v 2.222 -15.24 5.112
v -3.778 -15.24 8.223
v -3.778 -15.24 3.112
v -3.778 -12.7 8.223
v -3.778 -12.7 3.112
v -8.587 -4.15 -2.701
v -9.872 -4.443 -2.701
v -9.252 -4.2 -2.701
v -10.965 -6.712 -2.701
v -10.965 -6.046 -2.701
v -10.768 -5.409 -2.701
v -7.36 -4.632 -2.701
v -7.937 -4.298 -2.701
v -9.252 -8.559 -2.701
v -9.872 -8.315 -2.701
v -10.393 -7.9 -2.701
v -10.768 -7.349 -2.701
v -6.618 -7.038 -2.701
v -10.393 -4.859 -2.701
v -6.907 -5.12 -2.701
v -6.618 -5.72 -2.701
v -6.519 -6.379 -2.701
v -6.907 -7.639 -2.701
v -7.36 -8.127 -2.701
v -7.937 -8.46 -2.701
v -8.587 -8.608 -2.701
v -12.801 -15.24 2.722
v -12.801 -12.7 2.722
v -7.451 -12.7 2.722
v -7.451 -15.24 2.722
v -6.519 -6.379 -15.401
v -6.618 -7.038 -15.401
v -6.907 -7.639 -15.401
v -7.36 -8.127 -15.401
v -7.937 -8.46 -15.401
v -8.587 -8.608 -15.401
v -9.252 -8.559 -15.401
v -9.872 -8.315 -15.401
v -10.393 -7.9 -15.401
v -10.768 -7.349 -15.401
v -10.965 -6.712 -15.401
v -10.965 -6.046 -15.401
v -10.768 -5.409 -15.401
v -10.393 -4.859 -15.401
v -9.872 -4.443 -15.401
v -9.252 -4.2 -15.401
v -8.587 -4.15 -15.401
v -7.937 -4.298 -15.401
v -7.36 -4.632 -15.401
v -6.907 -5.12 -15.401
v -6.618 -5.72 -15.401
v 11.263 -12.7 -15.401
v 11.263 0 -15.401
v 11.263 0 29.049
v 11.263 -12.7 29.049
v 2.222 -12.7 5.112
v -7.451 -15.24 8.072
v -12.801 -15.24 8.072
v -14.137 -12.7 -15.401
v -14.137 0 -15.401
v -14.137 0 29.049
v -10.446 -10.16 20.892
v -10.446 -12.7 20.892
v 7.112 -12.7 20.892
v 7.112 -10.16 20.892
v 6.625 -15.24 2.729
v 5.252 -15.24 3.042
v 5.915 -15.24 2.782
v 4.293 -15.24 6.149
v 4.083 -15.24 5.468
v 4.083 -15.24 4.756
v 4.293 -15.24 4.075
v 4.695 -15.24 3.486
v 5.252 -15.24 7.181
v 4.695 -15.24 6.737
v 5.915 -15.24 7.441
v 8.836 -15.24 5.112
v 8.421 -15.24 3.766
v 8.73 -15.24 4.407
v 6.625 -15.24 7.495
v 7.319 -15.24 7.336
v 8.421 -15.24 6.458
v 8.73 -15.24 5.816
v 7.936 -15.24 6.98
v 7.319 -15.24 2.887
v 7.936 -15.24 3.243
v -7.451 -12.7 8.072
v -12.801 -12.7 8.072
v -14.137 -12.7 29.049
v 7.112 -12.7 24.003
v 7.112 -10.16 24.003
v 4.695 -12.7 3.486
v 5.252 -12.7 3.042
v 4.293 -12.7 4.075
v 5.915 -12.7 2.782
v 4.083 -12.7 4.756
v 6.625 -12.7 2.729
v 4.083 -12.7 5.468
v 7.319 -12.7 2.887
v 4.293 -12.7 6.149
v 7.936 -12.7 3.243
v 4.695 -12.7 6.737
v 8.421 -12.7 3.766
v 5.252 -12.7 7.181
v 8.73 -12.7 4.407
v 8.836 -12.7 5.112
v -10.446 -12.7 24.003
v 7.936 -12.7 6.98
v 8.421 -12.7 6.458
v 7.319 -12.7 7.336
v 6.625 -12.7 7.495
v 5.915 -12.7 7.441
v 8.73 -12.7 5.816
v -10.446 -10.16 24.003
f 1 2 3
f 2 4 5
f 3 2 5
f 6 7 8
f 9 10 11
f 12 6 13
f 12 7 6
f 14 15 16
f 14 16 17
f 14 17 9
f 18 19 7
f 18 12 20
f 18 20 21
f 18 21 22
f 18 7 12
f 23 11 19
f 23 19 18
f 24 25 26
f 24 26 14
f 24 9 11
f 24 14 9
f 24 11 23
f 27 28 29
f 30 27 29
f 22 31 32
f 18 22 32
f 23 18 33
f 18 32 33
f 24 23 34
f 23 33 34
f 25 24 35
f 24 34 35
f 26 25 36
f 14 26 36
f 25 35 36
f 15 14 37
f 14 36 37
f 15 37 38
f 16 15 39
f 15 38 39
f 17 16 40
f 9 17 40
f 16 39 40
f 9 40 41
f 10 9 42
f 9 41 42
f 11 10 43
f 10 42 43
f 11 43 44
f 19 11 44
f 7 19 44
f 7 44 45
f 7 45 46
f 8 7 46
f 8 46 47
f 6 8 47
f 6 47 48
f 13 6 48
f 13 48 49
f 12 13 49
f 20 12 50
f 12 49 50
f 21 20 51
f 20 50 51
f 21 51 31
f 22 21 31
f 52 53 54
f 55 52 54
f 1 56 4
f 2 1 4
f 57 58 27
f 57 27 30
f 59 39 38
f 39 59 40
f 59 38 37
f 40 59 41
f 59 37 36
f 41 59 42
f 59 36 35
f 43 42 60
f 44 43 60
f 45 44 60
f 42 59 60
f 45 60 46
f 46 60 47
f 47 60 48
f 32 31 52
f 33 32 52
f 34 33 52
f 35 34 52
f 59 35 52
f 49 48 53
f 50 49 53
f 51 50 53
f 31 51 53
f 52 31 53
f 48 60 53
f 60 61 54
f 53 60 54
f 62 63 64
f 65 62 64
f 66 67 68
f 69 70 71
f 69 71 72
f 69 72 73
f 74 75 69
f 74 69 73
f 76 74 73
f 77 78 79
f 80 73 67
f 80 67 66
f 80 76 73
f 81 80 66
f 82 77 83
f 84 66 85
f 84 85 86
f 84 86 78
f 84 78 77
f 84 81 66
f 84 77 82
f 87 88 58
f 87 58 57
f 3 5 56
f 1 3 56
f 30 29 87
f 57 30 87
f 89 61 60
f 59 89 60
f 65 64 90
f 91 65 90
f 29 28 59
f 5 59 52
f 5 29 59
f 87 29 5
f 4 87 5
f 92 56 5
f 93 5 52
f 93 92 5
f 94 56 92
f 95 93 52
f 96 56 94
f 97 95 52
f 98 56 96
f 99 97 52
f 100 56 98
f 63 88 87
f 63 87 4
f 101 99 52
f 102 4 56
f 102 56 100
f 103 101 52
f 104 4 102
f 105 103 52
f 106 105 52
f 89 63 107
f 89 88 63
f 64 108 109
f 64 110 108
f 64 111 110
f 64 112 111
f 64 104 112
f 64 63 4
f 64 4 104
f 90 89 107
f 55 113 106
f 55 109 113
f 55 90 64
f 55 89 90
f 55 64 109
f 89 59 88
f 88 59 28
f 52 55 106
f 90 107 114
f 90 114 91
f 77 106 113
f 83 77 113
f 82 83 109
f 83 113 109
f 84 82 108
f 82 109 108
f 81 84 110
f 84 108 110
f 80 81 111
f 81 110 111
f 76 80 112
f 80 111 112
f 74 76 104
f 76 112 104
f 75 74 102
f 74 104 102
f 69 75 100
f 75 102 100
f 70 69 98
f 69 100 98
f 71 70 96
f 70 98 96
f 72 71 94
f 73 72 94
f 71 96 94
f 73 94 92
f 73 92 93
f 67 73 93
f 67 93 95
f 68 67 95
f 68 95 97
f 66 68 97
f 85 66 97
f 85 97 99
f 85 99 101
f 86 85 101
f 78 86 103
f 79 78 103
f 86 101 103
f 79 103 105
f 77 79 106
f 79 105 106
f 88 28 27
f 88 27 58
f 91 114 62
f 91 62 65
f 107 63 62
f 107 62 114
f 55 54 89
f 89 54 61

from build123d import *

# Parameters (mm, degrees)
F1_DEPTH  = 12.7
F2_W      = 17.557748
F2_H      = 3.1115
F3_DEPTH  = 2.54
F5_DEPTH  = 2.54
F6_W      = 5.349429
F6_H      = 5.349428
F7_DEPTH  = 2.54
F8_R      = 2.389631
F9_DEPTH  = 2.54
F10_R     = 2.235372
F11_DEPTH = 12.7


with BuildPart() as f1:
    # F0 (on Front) → F1 (new body)
    with BuildSketch(Plane.XZ):
        Polygon((-14.136652, 29.049095), (-14.136652, 0), (-14.136652, -15.400905), (11.263348, -15.400905), (11.263348, 29.049095), align=None)
    extrude(amount=F1_DEPTH)

    # F2 (on face) → F3 (cut)
    with BuildSketch(Plane.XZ.offset(12.7)):
        with Locations((-1.666876, 22.447251)):
            Rectangle(F2_W, F2_H)
    extrude(amount=-F3_DEPTH, mode=Mode.SUBTRACT)

    # F4 (on face) → F5 (join)
    with BuildSketch(Plane.XZ.offset(12.7)):
        Polygon((2.2225, 5.11175), (-3.77825, 8.223251), (-3.77825, 3.1115), align=None)
    extrude(amount=F5_DEPTH)

    # F6 (on face) → F7 (join)
    with BuildSketch(Plane.XZ.offset(12.7)):
        with Locations((-10.126119, 5.396833)):
            Rectangle(F6_W, F6_H)
    extrude(amount=F7_DEPTH)

    # F8 (on face) → F9 (join)
    with BuildSketch(Plane.XZ.offset(12.7)):
        with Locations((6.446437, 5.11175)):
            Circle(F8_R)
    extrude(amount=F9_DEPTH)

    # F10 (on face) → F11 (cut)
    with BuildSketch(Plane(origin=(0, 0, -15.400905), x_dir=(1, 0, 0), z_dir=(0, 0, -1))):
        with Locations((-8.754111, 6.379303)):
            Circle(F10_R)
    extrude(amount=-F11_DEPTH, mode=Mode.SUBTRACT)


solid = f1.part
